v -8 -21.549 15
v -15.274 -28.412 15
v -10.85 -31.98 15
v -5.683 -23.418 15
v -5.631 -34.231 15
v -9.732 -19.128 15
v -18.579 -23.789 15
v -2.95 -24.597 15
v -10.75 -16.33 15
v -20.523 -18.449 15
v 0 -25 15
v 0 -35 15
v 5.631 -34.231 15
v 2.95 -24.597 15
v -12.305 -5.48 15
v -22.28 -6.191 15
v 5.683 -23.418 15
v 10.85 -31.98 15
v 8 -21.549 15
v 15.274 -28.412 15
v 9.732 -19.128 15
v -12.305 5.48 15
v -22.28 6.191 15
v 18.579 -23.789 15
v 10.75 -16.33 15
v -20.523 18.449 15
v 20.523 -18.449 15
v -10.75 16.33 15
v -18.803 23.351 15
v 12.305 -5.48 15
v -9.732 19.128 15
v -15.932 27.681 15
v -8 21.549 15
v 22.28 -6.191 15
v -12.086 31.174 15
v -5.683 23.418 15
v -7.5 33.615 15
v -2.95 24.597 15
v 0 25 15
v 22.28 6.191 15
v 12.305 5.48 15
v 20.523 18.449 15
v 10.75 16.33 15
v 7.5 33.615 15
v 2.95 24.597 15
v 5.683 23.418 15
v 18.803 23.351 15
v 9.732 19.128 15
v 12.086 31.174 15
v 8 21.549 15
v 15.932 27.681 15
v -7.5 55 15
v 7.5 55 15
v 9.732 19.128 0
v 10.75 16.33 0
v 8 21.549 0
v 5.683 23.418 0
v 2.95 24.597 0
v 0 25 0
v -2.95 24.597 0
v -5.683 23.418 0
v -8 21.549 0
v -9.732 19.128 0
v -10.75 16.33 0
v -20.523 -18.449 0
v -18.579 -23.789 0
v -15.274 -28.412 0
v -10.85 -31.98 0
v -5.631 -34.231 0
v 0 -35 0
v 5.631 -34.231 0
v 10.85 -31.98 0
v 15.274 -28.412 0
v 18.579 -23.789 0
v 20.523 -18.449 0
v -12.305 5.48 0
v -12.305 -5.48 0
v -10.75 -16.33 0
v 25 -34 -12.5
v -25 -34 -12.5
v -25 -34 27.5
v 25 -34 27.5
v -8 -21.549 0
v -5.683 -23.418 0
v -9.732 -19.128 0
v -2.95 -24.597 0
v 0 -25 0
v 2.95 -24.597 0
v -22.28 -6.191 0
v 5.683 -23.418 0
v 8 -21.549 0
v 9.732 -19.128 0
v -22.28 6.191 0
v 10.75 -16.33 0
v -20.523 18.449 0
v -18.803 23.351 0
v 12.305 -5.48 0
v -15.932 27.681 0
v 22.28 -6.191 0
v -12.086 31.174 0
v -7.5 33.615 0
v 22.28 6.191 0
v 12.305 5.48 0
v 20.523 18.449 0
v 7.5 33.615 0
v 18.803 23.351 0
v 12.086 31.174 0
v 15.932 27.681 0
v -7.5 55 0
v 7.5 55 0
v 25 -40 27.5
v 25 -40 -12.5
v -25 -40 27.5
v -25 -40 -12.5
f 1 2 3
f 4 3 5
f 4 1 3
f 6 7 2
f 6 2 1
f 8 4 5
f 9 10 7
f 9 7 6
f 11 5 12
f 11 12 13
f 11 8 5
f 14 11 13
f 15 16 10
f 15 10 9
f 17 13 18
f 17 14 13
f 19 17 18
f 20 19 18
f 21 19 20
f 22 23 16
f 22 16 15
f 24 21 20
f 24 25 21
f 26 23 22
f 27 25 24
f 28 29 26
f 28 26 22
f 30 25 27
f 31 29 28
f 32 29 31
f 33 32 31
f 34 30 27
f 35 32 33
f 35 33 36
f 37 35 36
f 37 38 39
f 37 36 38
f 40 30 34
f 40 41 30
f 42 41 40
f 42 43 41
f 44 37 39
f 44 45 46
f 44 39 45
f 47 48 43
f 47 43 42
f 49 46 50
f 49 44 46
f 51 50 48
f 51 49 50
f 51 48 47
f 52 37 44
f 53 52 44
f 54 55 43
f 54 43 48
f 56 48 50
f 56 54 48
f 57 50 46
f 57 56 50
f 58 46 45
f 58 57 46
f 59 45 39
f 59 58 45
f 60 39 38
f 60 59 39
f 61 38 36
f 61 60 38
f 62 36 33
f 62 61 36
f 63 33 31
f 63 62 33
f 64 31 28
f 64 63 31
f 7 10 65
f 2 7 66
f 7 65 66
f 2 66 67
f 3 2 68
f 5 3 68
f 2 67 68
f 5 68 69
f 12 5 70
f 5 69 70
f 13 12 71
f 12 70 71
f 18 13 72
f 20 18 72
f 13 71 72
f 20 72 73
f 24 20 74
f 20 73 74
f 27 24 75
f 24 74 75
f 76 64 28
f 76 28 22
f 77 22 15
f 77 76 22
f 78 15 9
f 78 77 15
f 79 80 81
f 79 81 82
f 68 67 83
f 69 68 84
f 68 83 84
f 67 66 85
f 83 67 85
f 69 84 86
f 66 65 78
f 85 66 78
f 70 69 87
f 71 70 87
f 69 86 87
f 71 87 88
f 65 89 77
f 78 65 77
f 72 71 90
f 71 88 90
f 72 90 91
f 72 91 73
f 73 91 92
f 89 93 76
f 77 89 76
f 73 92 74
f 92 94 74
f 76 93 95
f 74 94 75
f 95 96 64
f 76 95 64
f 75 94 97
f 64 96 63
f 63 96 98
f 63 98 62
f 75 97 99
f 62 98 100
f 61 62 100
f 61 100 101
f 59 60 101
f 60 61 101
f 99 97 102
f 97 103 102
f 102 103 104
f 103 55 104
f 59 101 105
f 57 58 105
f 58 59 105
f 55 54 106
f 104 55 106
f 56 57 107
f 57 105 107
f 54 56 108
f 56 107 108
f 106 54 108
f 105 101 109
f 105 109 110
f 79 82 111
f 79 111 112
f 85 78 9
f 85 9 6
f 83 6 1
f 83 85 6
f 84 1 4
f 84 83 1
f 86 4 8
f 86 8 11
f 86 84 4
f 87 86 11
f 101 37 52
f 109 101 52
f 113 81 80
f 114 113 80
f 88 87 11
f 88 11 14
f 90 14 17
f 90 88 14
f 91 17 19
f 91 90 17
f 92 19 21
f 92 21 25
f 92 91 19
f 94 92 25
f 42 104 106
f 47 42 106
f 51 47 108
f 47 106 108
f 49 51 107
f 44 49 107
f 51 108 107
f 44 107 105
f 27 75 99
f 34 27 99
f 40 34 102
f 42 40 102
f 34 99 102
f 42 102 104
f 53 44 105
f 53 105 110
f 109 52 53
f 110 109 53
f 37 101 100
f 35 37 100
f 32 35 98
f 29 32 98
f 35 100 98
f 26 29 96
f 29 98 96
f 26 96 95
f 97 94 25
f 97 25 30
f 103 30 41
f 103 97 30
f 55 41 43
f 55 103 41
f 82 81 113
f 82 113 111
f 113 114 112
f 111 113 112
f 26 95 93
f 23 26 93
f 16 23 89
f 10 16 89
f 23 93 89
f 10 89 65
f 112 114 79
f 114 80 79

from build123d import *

# Parameters (mm, degrees)
AUFSATZ_LINEAR_AUSTRAGEN1_DEPTH      = 15
SKIZZE2_W                            = 50
SKIZZE2_H                            = 40
AUFSATZ_LINEAR_AUSTRAGEN2_DEPTH      = 1
AUFSATZ_LINEAR_AUSTRAGEN2_DEPTH_BACK = 5
SKIZZE3_W                            = 15
SKIZZE3_H                            = 21.384954754
AUFSATZ_LINEAR_AUSTRAGEN3_DEPTH      = 15


with BuildPart() as part:
    # Skizze1 → Aufsatz-Linear austragen1 (new body)
    with BuildSketch(Plane.XY):
        with BuildLine():
            ThreePointArc((20.52332913, 18.448928121), (0, 35), (-20.52332913, 18.448928121))
            ThreePointArc((-20.52332913, 18.448928121), (-22.5, 0), (-20.52332913, -18.448928121))
            ThreePointArc((-20.52332913, -18.448928121), (0, -35), (20.52332913, -18.448928121))
            ThreePointArc((20.52332913, -18.448928121), (22.5, 0), (20.52332913, 18.448928121))
        make_face()
        with BuildLine():
            ThreePointArc((10.750315259, 16.330390921), (0, 25), (-10.750315259, 16.330390921))
            ThreePointArc((-10.750315259, 16.330390921), (-12.5, 0), (-10.750315259, -16.330390921))
            ThreePointArc((-10.750315259, -16.330390921), (-6.905276963, -22.562543434), (0, -25))
            ThreePointArc((0, -25), (6.905276963, -22.562543434), (10.750315259, -16.330390921))
            ThreePointArc((10.750315259, -16.330390921), (12.5, 0), (10.750315259, 16.330390921))
        make_face(mode=Mode.SUBTRACT)
    extrude(amount=AUFSATZ_LINEAR_AUSTRAGEN1_DEPTH)

    # Skizze3 → Aufsatz-Linear austragen3 (add)
    with BuildSketch(Plane.XY.offset(15)):
        with Locations((0, 44.307522623)):
            Rectangle(SKIZZE3_W, SKIZZE3_H)
    extrude(amount=-AUFSATZ_LINEAR_AUSTRAGEN3_DEPTH)


with BuildPart() as body_2:
    # Skizze2 → Aufsatz-Linear austragen2 (new body, two sides)
    with BuildSketch(Plane(origin=(0, -35, 0), x_dir=(1, 0, 0), z_dir=(0, 1, 0))) as aufsatz_linear_austragen2_sk:
        with Locations((0, -7.5)):
            Rectangle(SKIZZE2_W, SKIZZE2_H)
    extrude(amount=AUFSATZ_LINEAR_AUSTRAGEN2_DEPTH)
    extrude(aufsatz_linear_austragen2_sk.sketch, amount=-AUFSATZ_LINEAR_AUSTRAGEN2_DEPTH_BACK)


solid = Compound([part.part, body_2.part])
